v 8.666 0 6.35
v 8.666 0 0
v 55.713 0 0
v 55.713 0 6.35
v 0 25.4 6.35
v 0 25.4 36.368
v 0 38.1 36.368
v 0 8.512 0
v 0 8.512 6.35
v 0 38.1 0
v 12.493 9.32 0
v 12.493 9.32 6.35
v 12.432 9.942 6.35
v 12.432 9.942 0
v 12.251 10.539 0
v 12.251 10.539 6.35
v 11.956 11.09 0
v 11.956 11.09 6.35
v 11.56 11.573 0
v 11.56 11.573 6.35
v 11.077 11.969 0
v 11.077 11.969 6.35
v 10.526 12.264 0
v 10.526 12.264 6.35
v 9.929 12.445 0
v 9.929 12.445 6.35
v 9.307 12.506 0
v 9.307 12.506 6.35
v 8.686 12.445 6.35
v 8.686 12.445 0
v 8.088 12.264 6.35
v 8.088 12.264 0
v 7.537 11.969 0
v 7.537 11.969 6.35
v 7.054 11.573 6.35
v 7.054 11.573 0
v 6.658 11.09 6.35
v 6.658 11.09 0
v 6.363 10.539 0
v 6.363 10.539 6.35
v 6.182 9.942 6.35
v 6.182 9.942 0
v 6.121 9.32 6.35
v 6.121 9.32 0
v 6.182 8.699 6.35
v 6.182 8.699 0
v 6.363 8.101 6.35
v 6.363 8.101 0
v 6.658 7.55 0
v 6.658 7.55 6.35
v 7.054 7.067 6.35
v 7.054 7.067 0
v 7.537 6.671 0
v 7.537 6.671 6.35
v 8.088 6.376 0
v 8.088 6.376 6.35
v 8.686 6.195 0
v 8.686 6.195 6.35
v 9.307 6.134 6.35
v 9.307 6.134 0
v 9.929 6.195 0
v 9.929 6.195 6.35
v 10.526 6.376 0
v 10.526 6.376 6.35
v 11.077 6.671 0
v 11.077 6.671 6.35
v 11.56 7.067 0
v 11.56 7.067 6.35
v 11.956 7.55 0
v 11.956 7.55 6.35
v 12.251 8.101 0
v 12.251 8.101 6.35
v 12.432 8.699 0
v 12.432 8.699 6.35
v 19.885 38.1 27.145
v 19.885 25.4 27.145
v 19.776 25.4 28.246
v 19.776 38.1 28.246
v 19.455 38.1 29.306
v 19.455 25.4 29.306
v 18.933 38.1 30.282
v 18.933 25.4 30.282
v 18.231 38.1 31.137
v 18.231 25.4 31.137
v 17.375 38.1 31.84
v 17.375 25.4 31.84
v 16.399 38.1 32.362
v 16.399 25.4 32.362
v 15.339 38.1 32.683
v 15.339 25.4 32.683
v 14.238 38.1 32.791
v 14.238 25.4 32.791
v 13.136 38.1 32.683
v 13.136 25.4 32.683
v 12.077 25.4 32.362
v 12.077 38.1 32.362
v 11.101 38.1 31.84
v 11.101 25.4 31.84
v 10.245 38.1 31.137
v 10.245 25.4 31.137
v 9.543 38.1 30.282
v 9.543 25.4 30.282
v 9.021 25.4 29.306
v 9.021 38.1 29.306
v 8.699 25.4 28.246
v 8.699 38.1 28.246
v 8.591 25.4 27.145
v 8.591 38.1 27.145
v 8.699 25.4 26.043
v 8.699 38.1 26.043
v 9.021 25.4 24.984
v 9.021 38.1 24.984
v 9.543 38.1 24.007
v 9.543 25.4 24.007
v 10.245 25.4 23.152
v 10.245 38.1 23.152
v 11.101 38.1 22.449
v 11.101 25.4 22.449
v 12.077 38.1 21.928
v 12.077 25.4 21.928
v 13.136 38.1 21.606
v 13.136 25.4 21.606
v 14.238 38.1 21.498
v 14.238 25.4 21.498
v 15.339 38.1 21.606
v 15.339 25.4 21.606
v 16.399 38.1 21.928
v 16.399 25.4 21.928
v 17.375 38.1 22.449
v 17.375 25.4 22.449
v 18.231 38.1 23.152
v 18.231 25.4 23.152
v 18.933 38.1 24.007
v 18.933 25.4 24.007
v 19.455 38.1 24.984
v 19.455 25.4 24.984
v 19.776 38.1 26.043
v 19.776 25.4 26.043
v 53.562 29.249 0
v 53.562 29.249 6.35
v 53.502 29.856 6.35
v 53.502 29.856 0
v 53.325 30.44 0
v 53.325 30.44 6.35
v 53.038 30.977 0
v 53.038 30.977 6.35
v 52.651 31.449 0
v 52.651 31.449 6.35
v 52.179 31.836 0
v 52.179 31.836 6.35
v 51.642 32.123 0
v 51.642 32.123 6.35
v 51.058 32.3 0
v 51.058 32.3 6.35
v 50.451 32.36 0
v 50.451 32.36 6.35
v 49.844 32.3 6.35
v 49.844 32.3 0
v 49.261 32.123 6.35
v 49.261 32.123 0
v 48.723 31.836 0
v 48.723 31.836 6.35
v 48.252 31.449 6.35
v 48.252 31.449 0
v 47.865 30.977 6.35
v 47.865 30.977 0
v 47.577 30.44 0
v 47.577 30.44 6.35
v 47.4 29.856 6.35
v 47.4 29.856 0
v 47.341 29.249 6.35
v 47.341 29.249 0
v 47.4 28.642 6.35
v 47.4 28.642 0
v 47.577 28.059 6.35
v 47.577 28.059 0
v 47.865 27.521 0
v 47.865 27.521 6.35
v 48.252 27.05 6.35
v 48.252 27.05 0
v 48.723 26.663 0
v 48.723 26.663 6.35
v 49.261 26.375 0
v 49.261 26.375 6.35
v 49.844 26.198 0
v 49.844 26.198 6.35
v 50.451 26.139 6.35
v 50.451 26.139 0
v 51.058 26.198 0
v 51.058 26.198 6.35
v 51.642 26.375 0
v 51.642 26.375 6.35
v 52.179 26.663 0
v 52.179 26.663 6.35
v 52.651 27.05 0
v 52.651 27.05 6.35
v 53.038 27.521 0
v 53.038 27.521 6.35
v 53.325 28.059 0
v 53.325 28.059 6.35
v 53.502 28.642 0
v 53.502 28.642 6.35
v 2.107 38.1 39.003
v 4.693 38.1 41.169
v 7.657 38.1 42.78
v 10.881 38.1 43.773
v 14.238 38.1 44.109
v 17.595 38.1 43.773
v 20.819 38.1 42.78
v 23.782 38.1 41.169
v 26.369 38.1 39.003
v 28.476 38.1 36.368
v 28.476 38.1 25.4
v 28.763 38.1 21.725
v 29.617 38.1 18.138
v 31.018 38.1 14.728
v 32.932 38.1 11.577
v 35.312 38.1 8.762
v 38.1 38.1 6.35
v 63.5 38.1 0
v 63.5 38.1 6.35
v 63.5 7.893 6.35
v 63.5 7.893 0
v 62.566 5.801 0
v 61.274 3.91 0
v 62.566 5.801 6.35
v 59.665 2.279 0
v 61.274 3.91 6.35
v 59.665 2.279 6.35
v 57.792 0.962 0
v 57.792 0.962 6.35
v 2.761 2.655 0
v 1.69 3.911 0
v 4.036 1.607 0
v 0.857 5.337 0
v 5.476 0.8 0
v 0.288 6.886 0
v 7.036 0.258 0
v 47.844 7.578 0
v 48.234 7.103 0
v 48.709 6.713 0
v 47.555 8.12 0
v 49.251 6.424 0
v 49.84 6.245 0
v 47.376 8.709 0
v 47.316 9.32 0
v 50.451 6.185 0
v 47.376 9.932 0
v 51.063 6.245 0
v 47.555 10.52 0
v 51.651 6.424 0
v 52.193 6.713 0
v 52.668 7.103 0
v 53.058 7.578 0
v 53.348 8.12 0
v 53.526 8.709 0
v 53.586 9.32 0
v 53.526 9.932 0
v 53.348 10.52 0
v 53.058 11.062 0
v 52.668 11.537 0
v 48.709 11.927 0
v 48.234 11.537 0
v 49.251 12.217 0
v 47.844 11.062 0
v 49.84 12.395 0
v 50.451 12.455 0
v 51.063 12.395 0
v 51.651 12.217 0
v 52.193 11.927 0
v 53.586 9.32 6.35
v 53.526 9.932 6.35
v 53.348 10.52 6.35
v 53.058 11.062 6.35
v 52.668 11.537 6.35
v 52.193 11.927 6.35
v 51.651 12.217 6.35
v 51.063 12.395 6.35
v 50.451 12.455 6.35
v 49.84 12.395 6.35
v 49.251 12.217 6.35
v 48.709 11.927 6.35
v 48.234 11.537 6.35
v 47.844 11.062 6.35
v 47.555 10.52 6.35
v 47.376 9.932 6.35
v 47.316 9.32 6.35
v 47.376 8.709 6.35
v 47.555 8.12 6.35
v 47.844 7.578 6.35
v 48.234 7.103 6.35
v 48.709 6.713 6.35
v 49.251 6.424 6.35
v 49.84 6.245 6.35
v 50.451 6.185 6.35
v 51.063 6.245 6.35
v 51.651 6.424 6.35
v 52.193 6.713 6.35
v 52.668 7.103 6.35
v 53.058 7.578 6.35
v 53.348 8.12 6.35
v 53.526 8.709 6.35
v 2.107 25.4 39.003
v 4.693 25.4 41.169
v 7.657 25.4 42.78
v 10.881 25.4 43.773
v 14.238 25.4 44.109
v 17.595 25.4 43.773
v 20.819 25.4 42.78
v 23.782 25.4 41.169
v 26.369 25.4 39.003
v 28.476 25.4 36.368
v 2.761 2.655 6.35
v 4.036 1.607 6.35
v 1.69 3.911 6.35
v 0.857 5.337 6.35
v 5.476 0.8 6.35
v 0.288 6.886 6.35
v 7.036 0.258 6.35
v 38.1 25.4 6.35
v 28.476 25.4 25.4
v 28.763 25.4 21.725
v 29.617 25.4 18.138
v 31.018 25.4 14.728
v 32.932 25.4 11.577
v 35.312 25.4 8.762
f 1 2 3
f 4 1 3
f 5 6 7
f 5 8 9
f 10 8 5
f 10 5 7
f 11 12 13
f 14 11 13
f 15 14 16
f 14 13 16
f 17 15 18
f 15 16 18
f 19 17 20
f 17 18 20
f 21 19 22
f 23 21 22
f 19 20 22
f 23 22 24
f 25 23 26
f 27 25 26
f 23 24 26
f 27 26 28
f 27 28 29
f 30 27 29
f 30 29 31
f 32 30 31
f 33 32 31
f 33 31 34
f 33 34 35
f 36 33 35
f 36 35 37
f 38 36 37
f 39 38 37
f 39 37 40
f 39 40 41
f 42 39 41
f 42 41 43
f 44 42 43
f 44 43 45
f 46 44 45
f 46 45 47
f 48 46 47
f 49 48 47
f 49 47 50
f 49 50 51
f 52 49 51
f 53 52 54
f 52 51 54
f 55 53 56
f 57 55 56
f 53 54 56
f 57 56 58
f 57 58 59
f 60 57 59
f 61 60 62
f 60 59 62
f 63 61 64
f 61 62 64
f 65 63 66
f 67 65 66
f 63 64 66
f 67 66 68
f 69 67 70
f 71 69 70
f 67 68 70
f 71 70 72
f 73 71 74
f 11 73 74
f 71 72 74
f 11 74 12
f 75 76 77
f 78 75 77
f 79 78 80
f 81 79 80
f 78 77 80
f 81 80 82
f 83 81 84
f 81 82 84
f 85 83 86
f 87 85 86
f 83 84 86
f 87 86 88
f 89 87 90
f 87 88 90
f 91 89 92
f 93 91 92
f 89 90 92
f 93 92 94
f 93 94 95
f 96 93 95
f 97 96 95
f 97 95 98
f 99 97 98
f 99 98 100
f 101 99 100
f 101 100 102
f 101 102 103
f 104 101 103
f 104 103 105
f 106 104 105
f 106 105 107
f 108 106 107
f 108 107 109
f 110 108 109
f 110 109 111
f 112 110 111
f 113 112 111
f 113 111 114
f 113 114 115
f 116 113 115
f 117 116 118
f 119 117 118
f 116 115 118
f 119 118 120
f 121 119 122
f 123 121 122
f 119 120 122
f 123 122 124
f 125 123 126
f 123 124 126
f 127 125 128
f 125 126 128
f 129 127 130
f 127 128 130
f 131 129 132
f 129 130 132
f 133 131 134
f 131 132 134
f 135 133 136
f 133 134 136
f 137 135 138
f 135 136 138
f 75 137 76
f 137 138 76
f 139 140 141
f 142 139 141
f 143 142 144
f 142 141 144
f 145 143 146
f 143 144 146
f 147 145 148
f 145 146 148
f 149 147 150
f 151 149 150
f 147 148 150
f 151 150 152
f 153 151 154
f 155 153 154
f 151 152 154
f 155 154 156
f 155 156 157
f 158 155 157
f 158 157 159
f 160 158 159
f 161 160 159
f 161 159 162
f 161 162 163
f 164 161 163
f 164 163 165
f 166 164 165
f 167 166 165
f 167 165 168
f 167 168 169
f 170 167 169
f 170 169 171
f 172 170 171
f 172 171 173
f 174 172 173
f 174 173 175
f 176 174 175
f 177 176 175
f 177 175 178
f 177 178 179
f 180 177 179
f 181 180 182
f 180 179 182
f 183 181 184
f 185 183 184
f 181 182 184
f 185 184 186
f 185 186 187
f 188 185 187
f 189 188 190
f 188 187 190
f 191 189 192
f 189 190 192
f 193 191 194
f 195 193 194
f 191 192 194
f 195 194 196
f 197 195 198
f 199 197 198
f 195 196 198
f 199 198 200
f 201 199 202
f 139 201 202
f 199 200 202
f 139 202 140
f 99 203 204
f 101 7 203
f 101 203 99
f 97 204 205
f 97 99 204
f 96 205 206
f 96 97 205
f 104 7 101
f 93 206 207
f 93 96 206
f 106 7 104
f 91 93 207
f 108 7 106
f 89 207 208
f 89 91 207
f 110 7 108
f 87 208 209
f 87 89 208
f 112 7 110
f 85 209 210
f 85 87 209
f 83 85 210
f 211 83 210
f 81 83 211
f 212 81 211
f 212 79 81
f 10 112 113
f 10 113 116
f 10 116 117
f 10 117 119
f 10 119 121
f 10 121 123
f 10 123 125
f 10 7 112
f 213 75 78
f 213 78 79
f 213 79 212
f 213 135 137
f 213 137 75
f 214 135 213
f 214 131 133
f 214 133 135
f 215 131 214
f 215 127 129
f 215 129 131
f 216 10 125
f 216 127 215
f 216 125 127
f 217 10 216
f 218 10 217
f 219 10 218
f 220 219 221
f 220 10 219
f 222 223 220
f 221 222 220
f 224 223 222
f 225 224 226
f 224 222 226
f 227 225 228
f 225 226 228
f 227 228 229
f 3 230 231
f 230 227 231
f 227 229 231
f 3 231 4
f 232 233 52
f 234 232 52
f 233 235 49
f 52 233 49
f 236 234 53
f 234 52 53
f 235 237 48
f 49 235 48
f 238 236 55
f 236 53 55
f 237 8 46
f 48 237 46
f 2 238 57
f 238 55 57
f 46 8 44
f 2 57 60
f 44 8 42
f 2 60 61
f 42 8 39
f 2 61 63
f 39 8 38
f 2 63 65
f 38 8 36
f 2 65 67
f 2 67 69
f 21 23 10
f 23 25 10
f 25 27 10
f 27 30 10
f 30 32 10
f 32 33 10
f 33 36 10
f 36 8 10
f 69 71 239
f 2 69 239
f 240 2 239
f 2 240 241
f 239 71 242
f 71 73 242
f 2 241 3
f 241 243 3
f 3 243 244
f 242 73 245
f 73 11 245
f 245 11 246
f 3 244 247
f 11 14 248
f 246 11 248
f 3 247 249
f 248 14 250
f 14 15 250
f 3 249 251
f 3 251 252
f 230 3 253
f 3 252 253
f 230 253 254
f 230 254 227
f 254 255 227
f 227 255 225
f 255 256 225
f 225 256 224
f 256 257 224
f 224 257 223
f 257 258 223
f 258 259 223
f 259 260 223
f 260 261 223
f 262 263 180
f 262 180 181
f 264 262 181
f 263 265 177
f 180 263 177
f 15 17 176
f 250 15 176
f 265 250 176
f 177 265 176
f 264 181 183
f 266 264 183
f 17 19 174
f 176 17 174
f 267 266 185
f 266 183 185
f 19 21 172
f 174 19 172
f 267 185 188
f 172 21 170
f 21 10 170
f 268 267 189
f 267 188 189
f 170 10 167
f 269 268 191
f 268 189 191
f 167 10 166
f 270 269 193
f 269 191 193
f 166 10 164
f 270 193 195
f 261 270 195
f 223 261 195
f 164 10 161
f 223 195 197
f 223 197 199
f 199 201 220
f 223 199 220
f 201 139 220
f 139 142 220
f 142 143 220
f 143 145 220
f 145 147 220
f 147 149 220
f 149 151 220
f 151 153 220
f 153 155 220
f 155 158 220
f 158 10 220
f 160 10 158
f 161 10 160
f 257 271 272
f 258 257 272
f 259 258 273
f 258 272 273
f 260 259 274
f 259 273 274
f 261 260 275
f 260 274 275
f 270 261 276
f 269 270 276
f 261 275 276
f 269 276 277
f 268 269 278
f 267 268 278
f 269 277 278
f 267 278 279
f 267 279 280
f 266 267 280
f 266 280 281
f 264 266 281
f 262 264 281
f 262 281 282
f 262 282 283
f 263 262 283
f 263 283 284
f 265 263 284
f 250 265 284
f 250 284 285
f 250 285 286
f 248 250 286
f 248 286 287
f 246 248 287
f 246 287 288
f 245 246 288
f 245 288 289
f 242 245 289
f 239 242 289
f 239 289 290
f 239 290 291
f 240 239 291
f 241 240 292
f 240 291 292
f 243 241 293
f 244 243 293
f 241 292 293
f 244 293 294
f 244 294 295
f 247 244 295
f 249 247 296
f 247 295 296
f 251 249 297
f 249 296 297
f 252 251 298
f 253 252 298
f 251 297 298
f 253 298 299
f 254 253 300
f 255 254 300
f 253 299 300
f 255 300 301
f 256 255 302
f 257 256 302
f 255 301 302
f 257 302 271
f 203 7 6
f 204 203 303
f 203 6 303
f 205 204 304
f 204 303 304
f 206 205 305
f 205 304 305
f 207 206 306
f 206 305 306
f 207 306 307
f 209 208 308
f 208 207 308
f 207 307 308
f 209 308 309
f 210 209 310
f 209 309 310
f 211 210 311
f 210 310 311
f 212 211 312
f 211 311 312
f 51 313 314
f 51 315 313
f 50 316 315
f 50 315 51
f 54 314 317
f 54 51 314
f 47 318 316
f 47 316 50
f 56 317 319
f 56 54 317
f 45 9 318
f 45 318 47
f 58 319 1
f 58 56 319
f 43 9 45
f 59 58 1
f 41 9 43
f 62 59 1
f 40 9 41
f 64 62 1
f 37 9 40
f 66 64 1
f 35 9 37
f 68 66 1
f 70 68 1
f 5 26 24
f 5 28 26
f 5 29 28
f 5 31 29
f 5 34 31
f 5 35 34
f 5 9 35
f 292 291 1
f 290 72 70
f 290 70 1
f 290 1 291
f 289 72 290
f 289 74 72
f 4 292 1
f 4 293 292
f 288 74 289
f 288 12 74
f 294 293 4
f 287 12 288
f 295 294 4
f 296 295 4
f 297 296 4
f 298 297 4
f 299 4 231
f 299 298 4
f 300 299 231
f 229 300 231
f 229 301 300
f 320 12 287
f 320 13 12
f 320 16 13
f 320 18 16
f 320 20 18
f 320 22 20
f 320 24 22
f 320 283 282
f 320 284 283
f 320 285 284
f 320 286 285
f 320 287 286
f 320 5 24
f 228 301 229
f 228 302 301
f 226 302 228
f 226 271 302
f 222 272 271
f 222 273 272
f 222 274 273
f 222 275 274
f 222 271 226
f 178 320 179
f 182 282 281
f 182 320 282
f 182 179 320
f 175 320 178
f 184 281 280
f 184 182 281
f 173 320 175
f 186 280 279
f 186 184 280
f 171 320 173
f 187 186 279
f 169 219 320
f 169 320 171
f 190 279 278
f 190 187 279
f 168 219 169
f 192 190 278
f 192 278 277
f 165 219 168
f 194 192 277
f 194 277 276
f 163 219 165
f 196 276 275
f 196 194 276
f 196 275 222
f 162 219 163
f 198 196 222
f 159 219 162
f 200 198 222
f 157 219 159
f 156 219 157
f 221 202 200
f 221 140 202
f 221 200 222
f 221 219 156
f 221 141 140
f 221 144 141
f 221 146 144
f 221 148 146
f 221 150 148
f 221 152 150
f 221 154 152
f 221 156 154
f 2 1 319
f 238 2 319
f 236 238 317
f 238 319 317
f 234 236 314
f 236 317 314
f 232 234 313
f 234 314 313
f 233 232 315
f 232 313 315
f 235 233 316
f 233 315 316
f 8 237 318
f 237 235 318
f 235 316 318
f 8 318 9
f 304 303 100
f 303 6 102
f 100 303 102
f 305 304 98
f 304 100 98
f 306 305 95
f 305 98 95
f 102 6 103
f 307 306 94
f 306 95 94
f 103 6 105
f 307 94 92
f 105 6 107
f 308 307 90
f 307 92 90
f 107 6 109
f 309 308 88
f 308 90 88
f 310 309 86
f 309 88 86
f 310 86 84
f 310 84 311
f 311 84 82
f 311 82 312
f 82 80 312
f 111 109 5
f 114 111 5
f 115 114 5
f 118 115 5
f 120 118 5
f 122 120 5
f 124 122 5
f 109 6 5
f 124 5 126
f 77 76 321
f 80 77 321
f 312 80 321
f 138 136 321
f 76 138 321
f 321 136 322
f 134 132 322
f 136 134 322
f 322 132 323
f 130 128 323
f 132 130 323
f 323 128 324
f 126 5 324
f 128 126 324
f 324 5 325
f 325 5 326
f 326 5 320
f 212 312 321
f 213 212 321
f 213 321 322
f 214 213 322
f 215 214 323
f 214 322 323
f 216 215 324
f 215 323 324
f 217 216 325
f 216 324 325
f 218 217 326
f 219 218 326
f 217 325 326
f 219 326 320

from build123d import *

# Parameters (mm, degrees)
F0_W      = 63.5
F0_H      = 38.1
F1_DEPTH  = 6.35
F3_DEPTH  = 25.4
F4_W      = 38.1
F4_H      = 12.7
F5_DEPTH  = 38.1
F7_DEPTH  = 25.4
F8_R      = 5.646791
F9_DEPTH  = 25.4
F10_R     = 3.186215
F10_R_2   = 3.13512
F10_R_3   = 3.110599
F11_DEPTH = 25.4


with BuildPart() as f1:
    # F0 (on Top) → F1 (new body)
    with BuildSketch(Plane.XY):
        with Locations((31.75, 19.05)):
            Rectangle(F0_W, F0_H)
    extrude(amount=F1_DEPTH)

    # F2 (on face) → F3 (cut)
    with BuildSketch(Plane.XY.offset(6.35)):
        with BuildLine():
            ThreePointArc((8.66646, 0), (2.760987, 2.655022), (0, 8.511703))
            Line((0, 8.511703), (0, 0))
            Line((0, 0), (8.66646, 0))
        make_face()
        with BuildLine():
            ThreePointArc((63.5, 7.892669), (60.506344, 3.058511), (55.712957, 0))
            Line((55.712957, 0), (63.5, 0))
            Line((63.5, 0), (63.5, 7.892669))
        make_face()
    extrude(amount=-F3_DEPTH, mode=Mode.SUBTRACT)

    # F4 (on face) → F5 (join)
    with BuildSketch(Plane.XY.offset(6.35)):
        with Locations((19.05, 31.75)):
            Rectangle(F4_W, F4_H)
    extrude(amount=F5_DEPTH)

    # F6 (on face) → F7 (cut)
    with BuildSketch(Plane.XZ.offset(-25.4)):
        with BuildLine():
            Line((0, 44.45), (0, 36.368184))
            ThreePointArc((0, 36.368184), (14.237756, 44.108916), (28.475512, 36.368184))
            Line((28.475512, 36.368184), (28.475512, 25.4))
            ThreePointArc((28.475512, 25.4), (31.018235, 14.728387), (38.1, 6.35))
            Line((38.1, 6.35), (38.1, 25.4))
            Line((38.1, 25.4), (38.1, 44.45))
            Line((38.1, 44.45), (0, 44.45))
        make_face()
    extrude(amount=-F7_DEPTH, mode=Mode.SUBTRACT)

    # F8 (on face) → F9 (cut)
    with BuildSketch(Plane.XZ.offset(-25.4)):
        with Locations((14.237756, 27.144589)):
            Circle(F8_R)
    extrude(amount=-F9_DEPTH, mode=Mode.SUBTRACT)

    # F10 (on face) → F11 (cut)
    with BuildSketch(Plane.XY.offset(6.35)):
        with Locations((9.307119, 9.320174)):
            Circle(F10_R)
        with Locations((50.451182, 9.320174)):
            Circle(F10_R_2)
        with Locations((50.451182, 29.249305)):
            Circle(F10_R_3)
    extrude(amount=-F11_DEPTH, mode=Mode.SUBTRACT)


solid = f1.part
